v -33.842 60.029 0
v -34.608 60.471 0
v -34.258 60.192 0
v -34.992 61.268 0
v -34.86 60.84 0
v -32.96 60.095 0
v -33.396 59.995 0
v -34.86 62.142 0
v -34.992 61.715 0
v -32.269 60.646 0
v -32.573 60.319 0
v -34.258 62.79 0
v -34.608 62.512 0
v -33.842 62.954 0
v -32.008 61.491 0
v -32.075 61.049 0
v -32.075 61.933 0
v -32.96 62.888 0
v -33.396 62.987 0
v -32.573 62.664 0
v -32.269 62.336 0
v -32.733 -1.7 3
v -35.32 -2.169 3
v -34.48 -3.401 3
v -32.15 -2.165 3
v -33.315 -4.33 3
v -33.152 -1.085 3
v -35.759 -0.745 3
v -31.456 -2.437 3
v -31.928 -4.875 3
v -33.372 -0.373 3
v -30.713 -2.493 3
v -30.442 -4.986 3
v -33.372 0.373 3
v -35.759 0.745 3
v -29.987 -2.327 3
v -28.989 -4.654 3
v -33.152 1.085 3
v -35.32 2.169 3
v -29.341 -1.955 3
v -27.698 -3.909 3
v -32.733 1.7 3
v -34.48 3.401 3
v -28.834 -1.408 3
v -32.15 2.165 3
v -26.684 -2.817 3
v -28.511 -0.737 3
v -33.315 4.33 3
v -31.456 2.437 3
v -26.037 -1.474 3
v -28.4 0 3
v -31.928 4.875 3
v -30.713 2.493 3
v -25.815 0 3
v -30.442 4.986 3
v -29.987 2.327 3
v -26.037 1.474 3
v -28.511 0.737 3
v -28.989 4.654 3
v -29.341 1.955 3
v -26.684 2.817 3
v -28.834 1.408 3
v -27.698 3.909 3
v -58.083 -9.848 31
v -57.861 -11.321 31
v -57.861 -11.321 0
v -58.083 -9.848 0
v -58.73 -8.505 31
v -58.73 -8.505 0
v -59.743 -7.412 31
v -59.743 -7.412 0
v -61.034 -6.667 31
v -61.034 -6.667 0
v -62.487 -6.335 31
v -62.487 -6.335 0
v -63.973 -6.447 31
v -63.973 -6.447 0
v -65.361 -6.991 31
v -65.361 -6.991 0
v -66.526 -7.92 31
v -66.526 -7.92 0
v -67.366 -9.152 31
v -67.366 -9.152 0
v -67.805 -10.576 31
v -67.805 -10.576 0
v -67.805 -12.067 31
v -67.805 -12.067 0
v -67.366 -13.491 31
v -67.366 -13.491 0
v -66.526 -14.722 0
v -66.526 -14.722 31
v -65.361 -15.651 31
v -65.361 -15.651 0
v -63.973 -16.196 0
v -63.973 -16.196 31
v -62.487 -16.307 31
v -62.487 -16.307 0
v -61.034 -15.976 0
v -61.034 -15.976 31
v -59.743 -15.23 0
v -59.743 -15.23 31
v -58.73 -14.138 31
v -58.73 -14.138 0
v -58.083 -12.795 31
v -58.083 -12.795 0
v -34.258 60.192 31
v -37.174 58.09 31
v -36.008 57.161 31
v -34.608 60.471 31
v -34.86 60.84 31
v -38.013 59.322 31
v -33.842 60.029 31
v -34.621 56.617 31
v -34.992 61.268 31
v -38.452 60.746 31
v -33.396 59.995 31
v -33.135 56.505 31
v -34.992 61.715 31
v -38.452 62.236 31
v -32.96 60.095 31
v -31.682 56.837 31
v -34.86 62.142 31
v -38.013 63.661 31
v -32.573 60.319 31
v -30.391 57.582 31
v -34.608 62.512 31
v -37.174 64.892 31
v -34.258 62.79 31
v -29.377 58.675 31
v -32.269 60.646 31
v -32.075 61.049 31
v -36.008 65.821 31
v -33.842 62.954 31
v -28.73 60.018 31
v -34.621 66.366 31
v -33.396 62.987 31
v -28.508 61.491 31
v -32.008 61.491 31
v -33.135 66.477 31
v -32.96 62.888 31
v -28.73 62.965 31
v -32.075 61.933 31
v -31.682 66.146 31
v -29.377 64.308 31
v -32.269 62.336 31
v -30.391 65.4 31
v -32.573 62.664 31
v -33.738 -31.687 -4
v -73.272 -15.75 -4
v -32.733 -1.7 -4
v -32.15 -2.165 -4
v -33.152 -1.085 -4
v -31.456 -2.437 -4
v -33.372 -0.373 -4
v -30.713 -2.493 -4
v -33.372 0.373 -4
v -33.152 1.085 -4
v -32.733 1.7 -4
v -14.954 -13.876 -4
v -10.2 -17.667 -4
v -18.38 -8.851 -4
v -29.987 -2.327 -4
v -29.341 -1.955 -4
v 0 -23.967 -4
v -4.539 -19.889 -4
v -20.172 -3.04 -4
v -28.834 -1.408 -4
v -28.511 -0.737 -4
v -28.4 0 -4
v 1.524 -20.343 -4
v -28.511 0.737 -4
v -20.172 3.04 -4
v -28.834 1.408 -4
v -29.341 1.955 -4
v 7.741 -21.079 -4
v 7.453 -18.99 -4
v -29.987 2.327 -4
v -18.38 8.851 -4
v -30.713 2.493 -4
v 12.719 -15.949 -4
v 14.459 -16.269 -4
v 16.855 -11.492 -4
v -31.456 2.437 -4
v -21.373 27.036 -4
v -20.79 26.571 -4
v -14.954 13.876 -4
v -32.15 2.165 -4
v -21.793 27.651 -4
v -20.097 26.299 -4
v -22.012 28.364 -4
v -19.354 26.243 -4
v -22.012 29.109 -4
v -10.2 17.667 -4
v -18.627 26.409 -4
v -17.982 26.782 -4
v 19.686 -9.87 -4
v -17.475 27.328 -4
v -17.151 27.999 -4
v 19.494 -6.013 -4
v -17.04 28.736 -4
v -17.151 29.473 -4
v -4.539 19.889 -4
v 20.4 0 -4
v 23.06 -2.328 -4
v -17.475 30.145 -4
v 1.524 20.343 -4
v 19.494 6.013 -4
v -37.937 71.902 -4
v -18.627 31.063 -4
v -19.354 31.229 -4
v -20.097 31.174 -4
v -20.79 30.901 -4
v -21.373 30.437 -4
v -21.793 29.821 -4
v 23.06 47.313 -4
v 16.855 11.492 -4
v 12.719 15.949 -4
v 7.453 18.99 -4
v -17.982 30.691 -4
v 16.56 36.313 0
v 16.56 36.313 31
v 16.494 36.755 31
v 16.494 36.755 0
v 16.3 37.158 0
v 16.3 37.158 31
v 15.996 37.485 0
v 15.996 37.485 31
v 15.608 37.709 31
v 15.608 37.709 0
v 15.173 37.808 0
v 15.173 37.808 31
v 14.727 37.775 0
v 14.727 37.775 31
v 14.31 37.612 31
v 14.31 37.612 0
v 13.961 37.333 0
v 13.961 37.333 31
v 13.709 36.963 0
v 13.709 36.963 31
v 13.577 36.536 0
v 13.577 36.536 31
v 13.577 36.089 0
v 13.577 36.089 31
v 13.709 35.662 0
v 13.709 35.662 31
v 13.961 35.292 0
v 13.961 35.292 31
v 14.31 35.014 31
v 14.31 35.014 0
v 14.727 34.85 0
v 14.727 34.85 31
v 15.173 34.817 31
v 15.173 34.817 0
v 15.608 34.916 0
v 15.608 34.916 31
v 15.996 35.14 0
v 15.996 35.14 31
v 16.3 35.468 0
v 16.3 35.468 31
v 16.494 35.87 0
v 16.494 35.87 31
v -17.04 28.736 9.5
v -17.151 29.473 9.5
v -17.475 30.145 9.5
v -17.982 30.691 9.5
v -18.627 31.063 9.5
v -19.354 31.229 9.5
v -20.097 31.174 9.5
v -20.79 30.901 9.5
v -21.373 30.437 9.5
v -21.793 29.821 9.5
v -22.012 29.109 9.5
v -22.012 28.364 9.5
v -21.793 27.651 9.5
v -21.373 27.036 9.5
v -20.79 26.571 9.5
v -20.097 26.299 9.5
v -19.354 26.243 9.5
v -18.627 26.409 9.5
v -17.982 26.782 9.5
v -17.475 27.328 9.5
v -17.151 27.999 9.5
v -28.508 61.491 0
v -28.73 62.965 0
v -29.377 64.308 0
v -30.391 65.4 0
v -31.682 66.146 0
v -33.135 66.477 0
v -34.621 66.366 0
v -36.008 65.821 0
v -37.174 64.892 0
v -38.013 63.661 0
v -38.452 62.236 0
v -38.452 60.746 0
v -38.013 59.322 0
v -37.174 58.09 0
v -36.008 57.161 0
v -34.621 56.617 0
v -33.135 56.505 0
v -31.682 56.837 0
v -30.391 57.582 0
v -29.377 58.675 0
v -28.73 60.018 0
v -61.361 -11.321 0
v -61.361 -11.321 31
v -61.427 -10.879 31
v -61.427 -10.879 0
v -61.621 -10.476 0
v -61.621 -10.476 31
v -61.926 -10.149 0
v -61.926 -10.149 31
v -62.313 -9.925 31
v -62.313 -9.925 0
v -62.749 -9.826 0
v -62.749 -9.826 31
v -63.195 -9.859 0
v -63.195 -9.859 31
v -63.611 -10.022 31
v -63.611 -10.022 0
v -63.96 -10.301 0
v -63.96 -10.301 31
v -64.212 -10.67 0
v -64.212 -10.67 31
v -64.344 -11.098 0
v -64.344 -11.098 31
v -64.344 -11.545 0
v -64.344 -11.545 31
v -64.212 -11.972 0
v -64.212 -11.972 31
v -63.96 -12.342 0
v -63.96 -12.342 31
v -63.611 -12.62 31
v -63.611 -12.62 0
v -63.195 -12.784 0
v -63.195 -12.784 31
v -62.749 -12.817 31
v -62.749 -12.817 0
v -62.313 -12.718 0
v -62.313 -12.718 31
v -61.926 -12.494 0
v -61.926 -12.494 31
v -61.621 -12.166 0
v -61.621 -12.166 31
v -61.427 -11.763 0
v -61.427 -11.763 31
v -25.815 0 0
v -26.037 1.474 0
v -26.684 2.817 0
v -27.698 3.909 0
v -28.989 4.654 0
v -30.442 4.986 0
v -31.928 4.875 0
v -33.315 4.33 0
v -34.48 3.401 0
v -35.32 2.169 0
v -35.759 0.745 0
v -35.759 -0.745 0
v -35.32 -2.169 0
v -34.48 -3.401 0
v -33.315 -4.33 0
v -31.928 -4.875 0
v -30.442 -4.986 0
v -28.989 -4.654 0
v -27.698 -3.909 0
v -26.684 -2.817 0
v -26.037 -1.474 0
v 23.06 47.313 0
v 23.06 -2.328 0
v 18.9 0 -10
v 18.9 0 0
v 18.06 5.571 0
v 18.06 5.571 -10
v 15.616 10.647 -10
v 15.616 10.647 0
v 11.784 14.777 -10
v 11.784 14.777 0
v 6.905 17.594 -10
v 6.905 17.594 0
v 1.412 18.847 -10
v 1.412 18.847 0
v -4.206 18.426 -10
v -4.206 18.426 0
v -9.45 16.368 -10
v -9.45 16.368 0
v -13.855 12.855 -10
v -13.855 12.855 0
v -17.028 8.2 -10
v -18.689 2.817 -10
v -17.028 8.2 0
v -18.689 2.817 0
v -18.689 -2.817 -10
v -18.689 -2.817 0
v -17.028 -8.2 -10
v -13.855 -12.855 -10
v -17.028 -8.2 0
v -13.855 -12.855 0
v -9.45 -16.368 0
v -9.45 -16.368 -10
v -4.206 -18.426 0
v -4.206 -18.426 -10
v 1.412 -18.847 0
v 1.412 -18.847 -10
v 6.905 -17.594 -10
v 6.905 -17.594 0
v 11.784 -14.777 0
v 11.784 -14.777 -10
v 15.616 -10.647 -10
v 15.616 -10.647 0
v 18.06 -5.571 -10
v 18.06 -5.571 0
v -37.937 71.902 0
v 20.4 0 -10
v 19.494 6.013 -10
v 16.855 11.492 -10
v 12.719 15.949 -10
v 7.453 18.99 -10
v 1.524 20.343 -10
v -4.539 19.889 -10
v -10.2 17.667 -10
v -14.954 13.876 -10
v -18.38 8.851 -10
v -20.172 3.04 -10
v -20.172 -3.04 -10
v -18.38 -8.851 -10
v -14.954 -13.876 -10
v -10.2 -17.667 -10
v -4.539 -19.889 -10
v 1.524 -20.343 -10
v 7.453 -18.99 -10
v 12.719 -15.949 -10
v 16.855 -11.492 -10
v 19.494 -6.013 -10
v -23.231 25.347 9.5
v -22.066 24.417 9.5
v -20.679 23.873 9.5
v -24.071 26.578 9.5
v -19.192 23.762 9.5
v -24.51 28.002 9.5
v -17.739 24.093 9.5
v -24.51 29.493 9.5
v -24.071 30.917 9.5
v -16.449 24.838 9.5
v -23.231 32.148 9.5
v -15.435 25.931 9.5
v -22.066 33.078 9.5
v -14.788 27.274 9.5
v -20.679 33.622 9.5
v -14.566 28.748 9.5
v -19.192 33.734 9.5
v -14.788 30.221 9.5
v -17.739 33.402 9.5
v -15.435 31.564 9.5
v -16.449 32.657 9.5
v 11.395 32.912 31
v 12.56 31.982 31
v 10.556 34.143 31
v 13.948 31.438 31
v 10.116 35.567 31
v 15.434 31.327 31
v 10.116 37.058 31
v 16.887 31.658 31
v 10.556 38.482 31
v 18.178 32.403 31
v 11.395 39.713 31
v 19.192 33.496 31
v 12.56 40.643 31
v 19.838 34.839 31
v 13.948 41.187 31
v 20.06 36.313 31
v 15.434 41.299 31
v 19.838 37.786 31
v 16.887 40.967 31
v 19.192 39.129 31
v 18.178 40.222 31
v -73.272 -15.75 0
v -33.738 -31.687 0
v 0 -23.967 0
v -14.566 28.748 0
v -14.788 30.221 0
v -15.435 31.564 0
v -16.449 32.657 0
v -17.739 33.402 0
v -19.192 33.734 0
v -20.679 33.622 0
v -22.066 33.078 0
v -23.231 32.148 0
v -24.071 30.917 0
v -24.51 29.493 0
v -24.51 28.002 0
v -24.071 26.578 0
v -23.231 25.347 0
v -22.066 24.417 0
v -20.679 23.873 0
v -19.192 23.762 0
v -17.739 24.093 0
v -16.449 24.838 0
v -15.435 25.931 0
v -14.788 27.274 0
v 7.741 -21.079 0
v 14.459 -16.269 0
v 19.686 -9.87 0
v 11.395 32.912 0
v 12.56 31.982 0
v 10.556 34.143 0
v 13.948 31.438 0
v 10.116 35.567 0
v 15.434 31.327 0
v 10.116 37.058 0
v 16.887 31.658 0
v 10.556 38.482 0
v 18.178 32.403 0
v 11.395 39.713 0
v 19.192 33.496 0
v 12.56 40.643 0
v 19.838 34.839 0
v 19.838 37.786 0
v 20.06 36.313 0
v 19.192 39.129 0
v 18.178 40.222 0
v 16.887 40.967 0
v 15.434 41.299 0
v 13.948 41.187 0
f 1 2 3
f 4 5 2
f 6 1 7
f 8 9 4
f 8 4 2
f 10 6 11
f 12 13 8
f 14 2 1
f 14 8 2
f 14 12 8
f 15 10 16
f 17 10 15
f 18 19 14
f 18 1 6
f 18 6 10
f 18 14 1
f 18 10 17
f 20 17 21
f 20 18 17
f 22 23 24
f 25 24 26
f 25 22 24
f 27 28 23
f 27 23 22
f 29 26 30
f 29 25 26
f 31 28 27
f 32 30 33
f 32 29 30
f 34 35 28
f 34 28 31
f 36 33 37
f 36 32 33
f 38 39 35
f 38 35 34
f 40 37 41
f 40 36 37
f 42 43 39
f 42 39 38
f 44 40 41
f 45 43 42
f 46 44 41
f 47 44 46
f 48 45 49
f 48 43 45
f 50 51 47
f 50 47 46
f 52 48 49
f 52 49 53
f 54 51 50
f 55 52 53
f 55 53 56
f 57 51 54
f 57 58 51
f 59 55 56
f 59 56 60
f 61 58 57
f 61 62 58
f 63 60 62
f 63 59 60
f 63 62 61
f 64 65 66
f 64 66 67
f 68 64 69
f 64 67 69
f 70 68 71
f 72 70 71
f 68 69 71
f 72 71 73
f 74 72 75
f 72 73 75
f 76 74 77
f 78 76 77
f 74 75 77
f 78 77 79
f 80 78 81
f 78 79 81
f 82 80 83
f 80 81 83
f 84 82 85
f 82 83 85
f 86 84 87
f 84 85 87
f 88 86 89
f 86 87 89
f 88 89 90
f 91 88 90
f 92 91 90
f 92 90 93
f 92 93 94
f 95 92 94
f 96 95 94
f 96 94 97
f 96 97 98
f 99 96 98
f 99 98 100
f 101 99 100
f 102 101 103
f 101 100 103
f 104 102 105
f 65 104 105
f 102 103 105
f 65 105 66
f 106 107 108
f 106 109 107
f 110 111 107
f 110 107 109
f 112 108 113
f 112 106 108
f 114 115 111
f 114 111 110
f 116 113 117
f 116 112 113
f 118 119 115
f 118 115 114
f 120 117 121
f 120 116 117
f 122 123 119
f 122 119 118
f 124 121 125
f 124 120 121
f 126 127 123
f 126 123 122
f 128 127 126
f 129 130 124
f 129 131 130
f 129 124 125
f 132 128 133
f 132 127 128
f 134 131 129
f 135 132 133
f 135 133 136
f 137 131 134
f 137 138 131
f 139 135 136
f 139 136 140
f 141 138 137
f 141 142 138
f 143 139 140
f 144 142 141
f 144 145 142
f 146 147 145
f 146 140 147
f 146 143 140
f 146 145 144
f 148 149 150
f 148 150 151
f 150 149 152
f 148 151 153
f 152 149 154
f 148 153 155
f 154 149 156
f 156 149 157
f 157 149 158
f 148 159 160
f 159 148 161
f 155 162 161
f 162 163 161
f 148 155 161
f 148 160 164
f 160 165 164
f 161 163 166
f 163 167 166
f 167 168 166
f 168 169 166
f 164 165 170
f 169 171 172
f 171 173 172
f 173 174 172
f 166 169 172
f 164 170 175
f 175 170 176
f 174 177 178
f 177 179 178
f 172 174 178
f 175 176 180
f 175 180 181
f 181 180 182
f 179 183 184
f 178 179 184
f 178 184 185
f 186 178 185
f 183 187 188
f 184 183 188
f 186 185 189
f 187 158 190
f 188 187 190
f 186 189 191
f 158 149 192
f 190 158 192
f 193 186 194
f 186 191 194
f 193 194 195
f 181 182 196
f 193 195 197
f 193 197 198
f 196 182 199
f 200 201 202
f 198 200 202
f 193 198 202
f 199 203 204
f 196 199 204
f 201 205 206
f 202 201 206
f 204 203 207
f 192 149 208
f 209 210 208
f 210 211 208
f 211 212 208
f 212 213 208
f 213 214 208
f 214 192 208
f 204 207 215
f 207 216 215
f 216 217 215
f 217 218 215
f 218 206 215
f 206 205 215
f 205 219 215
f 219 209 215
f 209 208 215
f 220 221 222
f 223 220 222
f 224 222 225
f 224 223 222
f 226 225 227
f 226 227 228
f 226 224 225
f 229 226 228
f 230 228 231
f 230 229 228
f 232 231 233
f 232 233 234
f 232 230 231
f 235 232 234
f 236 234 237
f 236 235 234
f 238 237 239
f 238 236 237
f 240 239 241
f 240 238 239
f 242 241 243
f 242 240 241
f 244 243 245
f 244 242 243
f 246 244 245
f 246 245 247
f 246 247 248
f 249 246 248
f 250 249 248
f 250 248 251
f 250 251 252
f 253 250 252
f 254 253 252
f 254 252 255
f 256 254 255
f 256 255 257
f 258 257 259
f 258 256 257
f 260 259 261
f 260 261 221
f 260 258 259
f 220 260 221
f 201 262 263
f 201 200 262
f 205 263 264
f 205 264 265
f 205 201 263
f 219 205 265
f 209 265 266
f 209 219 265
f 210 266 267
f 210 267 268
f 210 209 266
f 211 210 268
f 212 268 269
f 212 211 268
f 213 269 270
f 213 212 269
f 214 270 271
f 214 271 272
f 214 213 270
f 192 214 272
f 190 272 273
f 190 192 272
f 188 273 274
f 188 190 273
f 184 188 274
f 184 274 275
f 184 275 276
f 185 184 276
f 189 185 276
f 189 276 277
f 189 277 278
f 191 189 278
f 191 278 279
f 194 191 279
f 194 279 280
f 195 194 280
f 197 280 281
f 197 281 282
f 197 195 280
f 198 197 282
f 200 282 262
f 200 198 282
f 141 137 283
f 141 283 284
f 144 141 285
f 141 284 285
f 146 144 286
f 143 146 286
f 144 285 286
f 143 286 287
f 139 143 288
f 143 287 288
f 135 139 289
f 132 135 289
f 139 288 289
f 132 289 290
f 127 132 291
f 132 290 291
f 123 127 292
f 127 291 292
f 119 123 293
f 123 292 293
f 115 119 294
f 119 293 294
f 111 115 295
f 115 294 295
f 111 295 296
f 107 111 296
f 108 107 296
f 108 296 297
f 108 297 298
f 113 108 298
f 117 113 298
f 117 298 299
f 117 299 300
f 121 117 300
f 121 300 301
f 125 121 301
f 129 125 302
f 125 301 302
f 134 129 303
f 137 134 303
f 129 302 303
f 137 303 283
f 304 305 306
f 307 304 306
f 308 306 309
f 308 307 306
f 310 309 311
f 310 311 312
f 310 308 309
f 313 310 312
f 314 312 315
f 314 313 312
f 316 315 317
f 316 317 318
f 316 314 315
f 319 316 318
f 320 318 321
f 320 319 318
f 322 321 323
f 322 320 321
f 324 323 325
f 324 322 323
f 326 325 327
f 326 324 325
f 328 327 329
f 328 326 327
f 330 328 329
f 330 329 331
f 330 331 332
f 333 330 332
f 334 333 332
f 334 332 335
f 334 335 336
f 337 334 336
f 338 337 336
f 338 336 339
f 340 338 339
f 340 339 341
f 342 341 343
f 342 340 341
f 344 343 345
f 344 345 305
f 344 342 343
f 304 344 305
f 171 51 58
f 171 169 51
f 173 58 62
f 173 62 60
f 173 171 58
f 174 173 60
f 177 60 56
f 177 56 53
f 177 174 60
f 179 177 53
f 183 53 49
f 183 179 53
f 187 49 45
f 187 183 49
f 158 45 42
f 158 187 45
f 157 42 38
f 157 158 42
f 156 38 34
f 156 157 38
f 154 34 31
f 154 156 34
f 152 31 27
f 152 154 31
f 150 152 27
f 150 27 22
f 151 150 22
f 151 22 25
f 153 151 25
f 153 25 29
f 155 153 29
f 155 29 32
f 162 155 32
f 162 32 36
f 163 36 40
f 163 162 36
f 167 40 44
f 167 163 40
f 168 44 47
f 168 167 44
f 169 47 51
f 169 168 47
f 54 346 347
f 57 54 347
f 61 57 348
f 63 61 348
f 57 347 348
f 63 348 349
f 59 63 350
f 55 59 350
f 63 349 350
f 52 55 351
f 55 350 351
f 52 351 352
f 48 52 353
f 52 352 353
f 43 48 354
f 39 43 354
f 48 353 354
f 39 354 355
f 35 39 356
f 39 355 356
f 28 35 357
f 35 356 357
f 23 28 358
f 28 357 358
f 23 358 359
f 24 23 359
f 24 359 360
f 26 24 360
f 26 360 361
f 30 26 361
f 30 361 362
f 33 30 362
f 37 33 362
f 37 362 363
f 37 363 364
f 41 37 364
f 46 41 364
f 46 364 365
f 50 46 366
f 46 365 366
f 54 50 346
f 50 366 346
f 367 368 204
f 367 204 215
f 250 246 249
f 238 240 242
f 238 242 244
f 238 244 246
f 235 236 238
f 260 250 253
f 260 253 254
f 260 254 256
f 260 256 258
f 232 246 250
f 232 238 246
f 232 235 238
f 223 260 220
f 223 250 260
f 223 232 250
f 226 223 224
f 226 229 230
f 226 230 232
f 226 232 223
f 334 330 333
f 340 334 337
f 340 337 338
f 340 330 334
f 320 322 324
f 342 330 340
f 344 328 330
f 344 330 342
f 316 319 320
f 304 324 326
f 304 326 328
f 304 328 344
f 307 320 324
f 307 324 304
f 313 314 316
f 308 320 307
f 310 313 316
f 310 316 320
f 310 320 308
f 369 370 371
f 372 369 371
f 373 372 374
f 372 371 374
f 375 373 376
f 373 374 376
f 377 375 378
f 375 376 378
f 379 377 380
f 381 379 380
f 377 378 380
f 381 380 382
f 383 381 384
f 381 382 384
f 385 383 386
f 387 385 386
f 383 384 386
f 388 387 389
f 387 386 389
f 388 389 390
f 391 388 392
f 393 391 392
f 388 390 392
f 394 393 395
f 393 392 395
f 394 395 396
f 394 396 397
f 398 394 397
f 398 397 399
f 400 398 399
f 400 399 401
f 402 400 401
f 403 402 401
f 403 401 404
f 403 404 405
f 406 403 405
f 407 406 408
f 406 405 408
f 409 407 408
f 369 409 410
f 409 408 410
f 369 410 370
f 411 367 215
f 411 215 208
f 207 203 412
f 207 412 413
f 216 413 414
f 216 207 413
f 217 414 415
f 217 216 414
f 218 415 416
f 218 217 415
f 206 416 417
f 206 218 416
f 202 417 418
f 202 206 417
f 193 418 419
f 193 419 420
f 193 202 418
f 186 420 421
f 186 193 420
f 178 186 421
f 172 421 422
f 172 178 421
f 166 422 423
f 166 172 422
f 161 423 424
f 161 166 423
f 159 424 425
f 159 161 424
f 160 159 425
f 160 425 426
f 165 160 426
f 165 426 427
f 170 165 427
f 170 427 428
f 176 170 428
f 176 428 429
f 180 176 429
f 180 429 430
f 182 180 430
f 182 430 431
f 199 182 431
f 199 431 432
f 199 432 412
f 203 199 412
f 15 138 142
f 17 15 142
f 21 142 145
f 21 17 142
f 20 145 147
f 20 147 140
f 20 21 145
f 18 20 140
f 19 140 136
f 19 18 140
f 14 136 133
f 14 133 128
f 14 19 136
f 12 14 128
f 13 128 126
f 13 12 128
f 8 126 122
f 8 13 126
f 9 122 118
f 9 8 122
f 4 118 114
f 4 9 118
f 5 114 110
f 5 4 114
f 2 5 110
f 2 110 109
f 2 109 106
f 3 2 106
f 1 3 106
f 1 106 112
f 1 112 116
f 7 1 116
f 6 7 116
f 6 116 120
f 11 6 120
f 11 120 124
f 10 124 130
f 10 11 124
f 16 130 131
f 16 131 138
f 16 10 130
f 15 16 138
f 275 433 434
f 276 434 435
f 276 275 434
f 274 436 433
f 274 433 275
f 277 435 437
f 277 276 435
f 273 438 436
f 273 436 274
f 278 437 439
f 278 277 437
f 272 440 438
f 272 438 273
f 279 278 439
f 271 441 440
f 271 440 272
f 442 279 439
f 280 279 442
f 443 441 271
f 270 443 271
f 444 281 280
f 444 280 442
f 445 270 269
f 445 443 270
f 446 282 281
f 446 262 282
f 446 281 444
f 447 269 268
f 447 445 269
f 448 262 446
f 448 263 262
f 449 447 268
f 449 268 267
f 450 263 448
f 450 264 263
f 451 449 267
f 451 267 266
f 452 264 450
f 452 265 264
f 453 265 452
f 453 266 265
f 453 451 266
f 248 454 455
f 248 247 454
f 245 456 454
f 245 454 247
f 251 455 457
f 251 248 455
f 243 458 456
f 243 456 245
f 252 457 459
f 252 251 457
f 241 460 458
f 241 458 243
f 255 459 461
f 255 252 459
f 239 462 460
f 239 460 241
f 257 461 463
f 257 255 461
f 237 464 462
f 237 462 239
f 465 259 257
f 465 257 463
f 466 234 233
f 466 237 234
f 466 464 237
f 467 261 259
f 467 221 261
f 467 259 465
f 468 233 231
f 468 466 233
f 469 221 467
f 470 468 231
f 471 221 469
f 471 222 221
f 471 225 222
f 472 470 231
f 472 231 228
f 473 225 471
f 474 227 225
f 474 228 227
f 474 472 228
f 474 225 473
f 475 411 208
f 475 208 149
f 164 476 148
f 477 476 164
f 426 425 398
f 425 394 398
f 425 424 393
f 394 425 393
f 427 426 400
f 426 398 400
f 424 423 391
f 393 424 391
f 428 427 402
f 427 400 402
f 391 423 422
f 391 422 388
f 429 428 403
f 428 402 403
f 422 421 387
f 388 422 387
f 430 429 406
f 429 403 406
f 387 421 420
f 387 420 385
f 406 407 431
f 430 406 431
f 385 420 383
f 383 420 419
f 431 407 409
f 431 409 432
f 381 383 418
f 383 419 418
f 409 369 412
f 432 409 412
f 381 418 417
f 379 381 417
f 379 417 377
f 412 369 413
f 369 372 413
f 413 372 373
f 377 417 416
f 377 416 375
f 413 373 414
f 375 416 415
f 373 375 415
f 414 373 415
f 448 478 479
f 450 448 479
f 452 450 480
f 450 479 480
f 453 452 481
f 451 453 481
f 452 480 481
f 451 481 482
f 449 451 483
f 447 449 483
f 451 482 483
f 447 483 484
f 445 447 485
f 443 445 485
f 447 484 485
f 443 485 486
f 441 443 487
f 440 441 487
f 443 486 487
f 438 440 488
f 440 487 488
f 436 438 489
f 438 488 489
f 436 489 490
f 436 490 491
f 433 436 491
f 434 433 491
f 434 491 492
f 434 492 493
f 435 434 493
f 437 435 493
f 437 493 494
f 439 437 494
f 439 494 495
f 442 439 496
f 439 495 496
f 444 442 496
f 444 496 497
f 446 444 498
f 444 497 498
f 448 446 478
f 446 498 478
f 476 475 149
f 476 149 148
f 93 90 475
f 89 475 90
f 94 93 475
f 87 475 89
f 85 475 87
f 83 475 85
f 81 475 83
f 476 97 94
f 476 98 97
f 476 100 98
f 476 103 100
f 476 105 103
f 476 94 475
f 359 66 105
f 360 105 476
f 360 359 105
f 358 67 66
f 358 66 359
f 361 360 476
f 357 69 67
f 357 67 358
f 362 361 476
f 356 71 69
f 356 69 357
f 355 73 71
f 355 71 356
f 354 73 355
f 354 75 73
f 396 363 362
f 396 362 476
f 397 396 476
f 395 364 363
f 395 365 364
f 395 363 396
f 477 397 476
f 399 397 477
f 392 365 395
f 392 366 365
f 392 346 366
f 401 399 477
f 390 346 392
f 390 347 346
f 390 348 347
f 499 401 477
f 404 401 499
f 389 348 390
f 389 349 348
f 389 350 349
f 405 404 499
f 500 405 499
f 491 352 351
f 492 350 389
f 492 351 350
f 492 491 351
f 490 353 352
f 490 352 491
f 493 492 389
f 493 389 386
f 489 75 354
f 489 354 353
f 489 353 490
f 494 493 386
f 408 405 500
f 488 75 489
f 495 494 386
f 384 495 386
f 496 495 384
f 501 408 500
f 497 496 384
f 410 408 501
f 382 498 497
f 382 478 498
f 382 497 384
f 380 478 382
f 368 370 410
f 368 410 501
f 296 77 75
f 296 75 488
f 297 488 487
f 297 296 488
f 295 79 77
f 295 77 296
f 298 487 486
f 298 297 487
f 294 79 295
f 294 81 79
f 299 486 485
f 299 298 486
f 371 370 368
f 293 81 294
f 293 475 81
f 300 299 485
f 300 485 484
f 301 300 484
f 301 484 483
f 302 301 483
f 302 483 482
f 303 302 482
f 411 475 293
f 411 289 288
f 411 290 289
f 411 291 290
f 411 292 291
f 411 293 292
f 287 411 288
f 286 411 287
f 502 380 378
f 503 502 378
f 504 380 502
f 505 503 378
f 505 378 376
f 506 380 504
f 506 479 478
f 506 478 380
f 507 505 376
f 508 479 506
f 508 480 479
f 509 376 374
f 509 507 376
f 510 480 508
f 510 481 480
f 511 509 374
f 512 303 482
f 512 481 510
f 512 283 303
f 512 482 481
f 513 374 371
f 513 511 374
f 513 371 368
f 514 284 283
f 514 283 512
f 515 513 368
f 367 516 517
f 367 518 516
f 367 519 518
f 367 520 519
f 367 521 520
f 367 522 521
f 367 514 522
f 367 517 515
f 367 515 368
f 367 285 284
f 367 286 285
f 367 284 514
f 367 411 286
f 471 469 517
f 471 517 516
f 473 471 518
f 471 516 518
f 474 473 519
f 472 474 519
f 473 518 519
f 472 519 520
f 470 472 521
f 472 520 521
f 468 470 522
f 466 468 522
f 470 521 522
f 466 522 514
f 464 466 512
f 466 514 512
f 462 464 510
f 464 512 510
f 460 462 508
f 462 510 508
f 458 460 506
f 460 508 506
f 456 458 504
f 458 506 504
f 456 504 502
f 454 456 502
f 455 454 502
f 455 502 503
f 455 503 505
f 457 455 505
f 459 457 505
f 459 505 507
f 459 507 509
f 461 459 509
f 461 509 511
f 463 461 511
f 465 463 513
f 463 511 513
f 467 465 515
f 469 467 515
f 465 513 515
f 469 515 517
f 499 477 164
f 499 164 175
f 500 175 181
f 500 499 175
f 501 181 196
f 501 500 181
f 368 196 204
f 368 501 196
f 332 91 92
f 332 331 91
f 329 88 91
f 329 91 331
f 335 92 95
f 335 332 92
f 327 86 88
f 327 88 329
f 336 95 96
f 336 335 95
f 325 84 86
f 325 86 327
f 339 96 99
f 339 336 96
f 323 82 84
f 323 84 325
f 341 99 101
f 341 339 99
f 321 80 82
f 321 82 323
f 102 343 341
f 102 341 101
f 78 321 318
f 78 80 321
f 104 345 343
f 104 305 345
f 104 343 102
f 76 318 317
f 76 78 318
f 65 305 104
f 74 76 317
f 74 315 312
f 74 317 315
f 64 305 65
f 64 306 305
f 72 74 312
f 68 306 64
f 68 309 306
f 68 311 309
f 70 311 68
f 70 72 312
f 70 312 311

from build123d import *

# Parameters (mm, degrees)
F0_R     = 20.4
F0_R_2   = 18.9
F1_DEPTH = 10
F0_R_3   = 2.5
F2_DEPTH = 4
F3_R     = 5
F3_R_2   = 2.5
F4_DEPTH = 3
F5_DEPTH = 9.5
F3_R_3   = 1.5
F6_DEPTH = 31


with BuildPart() as f1:
    # F0 (on Top) → F1 (new body)
    with BuildSketch(Plane.XY):
        Circle(F0_R)
        Circle(F0_R_2, mode=Mode.SUBTRACT)
    extrude(amount=-F1_DEPTH)

    # F0 (on Top) → F2 (join)
    with BuildSketch(Plane.XY):
        with BuildLine():
            Line((-37.936959, 71.902178), (-73.271744, -15.75))
            Line((-73.271744, -15.75), (-33.738027, -31.68703))
            Line((-33.738027, -31.68703), (0, -23.967391))
            ThreePointArc((0, -23.967391), (14.458763, -16.268714), (23.060463, -2.328261))
            Line((23.060463, -2.328261), (23.060463, 47.312592))
            Line((23.060463, 47.312592), (-37.936959, 71.902178))
        make_face()
        with Locations((-30.9, 0)):
            Circle(F0_R_3, mode=Mode.SUBTRACT)
        Circle(F0_R, mode=Mode.SUBTRACT)
        with Locations((-19.540395, 28.736203)):
            Circle(F0_R_3, mode=Mode.SUBTRACT)
    extrude(amount=-F2_DEPTH)

    # F3 (on face) → F4 (join)
    with BuildSketch(Plane.XY):
        with Locations((-30.81522, 0)):
            Circle(F3_R)
        with Locations((-30.9, 0)):
            Circle(F3_R_2, mode=Mode.SUBTRACT)
    extrude(amount=F4_DEPTH)

    # F3 (on face) → F5 (join)
    with BuildSketch(Plane.XY):
        with Locations((-19.565957, 28.747549)):
            Circle(F3_R)
        with Locations((-19.540395, 28.736203)):
            Circle(F3_R_2, mode=Mode.SUBTRACT)
    extrude(amount=F5_DEPTH)

    # F3 (on face) → F6 (join)
    with BuildSketch(Plane.XY):
        with Locations((15.060463, 36.312592)):
            Circle(F3_R)
        with Locations((15.060463, 36.312592)):
            Circle(F3_R_3, mode=Mode.SUBTRACT)
        with Locations((-33.508272, 61.491284)):
            Circle(F3_R)
        with Locations((-33.508272, 61.491284)):
            Circle(F3_R_3, mode=Mode.SUBTRACT)
        with Locations((-62.860849, -11.321312)):
            Circle(F3_R)
        with Locations((-62.860849, -11.321312)):
            Circle(F3_R_3, mode=Mode.SUBTRACT)
    extrude(amount=F6_DEPTH)


solid = f1.part
